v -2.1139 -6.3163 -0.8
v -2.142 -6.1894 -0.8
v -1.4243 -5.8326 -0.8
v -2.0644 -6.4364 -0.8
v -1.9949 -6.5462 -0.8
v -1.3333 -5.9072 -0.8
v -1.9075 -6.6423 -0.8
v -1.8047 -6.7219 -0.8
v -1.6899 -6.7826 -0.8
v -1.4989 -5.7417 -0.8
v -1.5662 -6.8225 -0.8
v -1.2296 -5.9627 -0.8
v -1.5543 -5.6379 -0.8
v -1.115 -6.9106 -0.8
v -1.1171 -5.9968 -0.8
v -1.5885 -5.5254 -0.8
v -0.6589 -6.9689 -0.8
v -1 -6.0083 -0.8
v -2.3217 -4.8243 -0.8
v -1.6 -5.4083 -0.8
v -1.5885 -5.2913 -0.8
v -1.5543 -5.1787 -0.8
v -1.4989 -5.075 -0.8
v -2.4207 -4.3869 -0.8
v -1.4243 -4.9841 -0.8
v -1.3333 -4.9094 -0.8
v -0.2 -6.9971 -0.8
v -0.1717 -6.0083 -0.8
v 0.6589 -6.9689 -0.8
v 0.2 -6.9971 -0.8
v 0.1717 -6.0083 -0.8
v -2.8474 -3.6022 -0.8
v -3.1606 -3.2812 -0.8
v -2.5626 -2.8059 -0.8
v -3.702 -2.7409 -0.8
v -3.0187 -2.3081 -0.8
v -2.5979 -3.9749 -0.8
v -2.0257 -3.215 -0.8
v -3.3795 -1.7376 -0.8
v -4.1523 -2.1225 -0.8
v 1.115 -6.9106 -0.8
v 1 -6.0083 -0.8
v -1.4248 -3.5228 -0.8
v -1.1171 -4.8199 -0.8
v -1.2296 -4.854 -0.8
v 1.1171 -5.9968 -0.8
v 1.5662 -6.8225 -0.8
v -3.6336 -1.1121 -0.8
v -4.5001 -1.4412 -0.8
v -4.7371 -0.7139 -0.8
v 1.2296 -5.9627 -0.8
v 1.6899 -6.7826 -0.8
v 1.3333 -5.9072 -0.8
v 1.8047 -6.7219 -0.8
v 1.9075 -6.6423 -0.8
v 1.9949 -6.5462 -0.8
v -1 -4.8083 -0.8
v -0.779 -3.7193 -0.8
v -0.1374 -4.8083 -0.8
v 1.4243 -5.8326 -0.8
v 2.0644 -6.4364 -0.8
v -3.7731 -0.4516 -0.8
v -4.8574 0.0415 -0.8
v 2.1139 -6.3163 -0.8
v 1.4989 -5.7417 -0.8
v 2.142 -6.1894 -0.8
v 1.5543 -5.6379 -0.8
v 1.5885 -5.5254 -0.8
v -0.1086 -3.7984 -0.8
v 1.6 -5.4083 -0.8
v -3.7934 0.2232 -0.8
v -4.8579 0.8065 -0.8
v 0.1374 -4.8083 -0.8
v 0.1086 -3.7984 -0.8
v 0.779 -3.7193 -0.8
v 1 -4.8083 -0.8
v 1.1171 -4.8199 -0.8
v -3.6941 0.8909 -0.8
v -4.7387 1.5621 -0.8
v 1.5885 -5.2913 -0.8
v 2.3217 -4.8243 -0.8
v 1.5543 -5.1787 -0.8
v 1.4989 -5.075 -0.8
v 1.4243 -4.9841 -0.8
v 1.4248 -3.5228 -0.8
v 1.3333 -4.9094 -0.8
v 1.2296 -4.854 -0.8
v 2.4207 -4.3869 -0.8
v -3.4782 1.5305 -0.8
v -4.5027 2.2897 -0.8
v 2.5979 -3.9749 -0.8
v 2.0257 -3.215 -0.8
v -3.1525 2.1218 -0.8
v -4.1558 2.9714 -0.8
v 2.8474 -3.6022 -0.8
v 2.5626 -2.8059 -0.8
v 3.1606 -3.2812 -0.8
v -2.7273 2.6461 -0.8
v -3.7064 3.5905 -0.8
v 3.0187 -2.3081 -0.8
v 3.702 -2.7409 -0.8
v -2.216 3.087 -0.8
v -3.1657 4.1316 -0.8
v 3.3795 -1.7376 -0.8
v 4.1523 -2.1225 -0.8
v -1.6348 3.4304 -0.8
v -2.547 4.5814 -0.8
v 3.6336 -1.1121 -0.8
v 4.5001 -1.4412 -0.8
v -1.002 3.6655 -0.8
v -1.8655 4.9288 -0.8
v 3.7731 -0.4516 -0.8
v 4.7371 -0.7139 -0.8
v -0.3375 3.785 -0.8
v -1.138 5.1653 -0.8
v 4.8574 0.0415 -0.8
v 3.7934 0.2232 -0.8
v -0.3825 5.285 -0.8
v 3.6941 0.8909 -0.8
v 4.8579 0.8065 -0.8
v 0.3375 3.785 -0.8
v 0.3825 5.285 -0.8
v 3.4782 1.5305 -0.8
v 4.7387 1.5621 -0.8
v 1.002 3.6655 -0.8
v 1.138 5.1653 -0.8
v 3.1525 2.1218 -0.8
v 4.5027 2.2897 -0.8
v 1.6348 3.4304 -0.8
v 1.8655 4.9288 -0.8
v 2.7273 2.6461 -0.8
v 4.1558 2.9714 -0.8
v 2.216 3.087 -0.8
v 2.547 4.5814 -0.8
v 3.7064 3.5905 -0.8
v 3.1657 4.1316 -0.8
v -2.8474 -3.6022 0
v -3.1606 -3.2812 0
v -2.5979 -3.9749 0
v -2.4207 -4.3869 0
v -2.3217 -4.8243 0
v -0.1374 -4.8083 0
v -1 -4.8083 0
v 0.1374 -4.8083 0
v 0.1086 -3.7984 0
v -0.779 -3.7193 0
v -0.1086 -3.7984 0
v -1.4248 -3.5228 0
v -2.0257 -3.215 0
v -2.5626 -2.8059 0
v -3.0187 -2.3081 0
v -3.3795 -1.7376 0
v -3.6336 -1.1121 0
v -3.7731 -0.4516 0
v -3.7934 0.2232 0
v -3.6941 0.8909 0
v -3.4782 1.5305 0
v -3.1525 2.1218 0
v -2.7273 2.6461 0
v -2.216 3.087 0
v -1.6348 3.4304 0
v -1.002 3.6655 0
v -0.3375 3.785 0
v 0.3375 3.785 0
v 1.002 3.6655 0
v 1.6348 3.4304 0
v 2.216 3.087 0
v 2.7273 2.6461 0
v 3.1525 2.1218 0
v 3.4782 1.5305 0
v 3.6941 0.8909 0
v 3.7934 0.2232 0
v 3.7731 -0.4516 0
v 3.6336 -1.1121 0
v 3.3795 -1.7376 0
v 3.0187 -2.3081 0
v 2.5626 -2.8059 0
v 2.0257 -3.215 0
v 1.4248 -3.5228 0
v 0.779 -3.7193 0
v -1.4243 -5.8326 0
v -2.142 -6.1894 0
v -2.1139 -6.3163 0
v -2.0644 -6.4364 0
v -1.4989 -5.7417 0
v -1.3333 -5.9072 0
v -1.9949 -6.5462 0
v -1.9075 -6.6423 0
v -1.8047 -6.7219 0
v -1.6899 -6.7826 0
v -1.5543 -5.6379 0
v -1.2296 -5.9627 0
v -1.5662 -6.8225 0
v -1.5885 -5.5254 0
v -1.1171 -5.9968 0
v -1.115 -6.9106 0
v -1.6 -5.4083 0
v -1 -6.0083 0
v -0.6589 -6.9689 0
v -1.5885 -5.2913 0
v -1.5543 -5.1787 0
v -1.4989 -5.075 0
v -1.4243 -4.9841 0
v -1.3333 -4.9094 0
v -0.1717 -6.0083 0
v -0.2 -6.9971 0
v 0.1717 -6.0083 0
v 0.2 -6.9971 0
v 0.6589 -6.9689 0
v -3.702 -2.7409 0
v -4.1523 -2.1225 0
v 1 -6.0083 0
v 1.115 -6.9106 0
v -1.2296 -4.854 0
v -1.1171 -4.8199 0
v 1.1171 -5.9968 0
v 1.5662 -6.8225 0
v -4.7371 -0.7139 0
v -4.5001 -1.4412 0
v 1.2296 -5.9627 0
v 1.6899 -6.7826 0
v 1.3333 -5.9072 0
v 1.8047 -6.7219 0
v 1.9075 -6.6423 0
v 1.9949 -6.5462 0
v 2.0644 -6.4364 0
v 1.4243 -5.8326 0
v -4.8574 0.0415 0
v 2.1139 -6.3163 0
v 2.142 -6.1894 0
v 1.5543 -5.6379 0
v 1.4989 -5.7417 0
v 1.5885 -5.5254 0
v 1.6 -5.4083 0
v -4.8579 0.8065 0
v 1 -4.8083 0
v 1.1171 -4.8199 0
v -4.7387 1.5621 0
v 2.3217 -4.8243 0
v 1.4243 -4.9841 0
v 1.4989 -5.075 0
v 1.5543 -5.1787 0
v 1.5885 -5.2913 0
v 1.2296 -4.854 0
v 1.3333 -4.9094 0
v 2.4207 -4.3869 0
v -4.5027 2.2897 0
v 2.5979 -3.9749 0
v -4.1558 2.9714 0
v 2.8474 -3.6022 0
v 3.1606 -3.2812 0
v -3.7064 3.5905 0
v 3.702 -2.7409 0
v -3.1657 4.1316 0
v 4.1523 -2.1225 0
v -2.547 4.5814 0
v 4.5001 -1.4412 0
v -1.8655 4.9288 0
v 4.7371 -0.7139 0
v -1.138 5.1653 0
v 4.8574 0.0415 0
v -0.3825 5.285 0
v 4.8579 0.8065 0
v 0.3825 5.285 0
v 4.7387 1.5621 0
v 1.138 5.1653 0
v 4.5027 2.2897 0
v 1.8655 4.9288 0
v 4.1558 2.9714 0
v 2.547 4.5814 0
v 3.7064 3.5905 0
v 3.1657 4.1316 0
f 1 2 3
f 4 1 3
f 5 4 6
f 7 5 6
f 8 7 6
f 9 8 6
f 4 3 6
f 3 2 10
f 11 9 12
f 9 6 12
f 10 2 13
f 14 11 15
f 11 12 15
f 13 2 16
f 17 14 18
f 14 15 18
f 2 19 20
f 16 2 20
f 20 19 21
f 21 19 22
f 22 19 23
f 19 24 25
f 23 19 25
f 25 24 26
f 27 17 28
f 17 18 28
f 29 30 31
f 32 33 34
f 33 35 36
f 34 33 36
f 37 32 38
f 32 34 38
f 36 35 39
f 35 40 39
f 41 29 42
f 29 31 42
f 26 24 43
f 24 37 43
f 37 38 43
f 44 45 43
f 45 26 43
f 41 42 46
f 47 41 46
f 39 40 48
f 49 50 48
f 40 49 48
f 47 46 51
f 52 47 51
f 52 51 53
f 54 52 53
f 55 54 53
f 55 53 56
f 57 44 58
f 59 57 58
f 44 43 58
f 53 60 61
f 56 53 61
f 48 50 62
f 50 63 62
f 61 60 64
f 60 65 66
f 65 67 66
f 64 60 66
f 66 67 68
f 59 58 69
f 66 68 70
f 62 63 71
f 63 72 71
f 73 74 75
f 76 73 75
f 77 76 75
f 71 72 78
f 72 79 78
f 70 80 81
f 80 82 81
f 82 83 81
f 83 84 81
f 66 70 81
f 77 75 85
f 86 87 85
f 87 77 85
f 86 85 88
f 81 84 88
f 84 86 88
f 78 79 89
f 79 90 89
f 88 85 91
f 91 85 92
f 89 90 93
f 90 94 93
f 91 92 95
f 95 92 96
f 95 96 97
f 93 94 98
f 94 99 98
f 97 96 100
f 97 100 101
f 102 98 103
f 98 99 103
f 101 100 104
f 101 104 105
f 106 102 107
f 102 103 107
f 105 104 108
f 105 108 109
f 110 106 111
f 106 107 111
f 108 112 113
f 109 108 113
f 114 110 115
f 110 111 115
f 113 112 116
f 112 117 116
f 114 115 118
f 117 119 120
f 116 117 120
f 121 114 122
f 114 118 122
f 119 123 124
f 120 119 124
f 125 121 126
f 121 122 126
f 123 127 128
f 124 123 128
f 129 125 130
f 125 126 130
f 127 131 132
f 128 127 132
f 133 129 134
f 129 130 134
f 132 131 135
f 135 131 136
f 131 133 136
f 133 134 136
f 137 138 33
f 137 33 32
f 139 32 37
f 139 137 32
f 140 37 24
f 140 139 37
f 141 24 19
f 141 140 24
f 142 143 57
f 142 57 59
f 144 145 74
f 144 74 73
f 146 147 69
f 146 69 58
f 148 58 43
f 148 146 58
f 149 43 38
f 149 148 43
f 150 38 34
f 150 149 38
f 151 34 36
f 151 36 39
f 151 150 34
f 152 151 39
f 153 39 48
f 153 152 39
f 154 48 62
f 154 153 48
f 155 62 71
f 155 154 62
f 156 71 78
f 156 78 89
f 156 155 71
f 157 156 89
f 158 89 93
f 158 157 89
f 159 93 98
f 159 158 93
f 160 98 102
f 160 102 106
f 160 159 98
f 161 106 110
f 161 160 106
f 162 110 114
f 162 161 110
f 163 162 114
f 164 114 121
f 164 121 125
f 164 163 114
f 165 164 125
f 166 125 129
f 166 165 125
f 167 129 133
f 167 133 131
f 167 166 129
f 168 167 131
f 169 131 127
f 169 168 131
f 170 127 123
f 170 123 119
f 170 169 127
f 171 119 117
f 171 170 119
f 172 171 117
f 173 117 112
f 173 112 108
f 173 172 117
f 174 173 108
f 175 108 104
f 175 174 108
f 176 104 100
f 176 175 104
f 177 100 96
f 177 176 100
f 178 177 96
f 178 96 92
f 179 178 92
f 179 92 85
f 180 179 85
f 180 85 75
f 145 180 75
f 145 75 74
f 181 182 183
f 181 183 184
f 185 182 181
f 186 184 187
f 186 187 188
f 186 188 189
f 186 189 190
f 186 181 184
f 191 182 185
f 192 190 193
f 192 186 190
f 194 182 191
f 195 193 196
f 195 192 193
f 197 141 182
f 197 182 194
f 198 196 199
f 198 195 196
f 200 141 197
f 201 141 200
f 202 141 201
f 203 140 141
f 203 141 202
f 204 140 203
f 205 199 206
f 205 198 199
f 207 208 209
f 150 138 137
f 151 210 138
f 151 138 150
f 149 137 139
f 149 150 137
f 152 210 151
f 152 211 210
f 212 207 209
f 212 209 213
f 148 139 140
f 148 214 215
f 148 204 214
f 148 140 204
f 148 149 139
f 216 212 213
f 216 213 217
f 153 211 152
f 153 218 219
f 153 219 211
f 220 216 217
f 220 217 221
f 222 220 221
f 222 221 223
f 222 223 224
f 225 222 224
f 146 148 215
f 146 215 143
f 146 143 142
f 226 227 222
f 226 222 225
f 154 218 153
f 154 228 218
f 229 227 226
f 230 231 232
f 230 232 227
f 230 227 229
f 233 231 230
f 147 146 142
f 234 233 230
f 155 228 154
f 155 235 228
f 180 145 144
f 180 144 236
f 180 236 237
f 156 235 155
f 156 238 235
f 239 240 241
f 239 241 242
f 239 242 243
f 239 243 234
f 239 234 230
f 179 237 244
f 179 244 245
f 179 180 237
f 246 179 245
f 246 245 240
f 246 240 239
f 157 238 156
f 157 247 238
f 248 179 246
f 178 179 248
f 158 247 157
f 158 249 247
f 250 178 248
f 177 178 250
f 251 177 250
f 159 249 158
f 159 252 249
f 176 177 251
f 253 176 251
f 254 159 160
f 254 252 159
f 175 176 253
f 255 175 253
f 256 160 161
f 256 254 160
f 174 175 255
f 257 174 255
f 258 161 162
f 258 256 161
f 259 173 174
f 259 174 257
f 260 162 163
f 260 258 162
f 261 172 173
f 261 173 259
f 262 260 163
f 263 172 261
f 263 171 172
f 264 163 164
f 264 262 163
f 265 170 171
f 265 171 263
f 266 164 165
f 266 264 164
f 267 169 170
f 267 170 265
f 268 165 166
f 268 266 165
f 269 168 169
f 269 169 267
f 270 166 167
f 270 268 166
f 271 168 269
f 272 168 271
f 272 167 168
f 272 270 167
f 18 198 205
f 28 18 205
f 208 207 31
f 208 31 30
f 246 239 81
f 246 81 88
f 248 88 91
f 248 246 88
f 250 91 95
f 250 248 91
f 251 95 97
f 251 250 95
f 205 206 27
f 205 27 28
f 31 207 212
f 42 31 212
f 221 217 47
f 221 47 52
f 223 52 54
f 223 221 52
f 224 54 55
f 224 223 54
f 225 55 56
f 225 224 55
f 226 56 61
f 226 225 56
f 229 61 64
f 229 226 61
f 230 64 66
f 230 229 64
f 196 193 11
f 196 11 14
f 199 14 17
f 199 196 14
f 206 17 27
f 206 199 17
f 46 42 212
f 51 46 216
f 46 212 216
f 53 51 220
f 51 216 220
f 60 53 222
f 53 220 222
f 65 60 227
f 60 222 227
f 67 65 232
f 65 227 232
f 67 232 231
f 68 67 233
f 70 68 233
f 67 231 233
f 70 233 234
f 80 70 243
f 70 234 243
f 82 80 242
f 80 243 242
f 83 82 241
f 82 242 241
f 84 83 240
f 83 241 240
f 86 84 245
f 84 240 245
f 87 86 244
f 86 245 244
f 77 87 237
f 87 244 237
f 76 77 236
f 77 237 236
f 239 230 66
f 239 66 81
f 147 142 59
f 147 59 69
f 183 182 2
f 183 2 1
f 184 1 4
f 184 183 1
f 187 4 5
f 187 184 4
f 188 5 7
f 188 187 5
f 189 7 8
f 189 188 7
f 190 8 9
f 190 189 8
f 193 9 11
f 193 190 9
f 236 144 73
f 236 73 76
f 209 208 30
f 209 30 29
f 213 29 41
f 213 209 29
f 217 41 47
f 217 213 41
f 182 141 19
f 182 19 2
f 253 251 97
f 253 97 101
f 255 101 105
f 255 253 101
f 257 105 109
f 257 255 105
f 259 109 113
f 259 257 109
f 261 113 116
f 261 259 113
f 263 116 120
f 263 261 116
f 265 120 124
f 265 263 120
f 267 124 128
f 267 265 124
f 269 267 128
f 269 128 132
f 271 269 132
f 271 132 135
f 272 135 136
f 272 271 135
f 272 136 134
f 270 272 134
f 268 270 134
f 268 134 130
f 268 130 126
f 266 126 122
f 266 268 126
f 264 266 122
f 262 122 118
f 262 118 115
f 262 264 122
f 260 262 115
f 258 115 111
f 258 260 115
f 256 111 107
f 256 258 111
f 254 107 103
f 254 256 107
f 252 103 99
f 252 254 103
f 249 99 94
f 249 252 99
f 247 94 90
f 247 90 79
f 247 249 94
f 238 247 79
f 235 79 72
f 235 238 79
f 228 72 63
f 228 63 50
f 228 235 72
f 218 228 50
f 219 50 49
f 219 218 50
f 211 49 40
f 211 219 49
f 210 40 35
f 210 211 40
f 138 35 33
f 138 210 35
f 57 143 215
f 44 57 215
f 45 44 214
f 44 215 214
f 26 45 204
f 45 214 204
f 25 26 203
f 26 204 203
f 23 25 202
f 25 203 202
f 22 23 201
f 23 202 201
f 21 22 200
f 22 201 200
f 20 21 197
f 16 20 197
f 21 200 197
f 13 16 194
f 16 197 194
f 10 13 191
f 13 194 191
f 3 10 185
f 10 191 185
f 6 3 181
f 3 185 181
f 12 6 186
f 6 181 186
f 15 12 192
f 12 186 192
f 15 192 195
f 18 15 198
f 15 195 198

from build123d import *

# Parameters (mm, degrees)
BODYSKE_R   = 0.6
BODY_DEPTH  = 0.8
NOTSKE_W    = 2
NOTSKE_H    = 1.2
NOTCH_DEPTH = 1.8


with BuildPart() as part:
    # BodySke → Body (new body)
    with BuildSketch(Plane.XY):
        with BuildLine():
            Line((0.108571429, -3.798448663), (0.2, -6.997142274))
            ThreePointArc((0.2, -6.997142274), (0.887407187, -6.943522772), (1.566204647, -6.822536405))
            ThreePointArc((1.566204647, -6.822536405), (1.953248067, -6.596169328), (2.141980652, -6.189445006))
            Line((2.141980652, -6.189445006), (2.321707775, -4.824281977))
            ThreePointArc((2.321707775, -4.824281977), (2.597941642, -3.974889916), (3.160591953, -3.281206522))
            ThreePointArc((3.160591953, -3.281206522), (0, 5.3), (-3.160591953, -3.281206522))
            ThreePointArc((-3.160591953, -3.281206522), (-2.597941642, -3.974889916), (-2.321707775, -4.824281977))
            Line((-2.321707775, -4.824281977), (-2.141980652, -6.189445006))
            ThreePointArc((-2.141980652, -6.189445006), (-1.953248067, -6.596169328), (-1.566204647, -6.822536405))
            ThreePointArc((-1.566204647, -6.822536405), (-0.887407187, -6.943522772), (-0.2, -6.997142274))
            Line((-0.2, -6.997142274), (-0.108571429, -3.798448663))
            ThreePointArc((-0.108571429, -3.798448663), (0, 3.8), (0.108571429, -3.798448663))
        make_face()
        with Locations((1, -5.408326913)):
            Circle(BODYSKE_R, mode=Mode.SUBTRACT)
        with Locations((-1, -5.408326913)):
            Circle(BODYSKE_R, mode=Mode.SUBTRACT)
    extrude(amount=-BODY_DEPTH)

    # NotSke → Notch (cut, through all)
    with BuildSketch(Plane.XY):
        with Locations((0, -5.408326913)):
            Rectangle(NOTSKE_W, NOTSKE_H)
    extrude(amount=-NOTCH_DEPTH, mode=Mode.SUBTRACT)


solid = part.part
